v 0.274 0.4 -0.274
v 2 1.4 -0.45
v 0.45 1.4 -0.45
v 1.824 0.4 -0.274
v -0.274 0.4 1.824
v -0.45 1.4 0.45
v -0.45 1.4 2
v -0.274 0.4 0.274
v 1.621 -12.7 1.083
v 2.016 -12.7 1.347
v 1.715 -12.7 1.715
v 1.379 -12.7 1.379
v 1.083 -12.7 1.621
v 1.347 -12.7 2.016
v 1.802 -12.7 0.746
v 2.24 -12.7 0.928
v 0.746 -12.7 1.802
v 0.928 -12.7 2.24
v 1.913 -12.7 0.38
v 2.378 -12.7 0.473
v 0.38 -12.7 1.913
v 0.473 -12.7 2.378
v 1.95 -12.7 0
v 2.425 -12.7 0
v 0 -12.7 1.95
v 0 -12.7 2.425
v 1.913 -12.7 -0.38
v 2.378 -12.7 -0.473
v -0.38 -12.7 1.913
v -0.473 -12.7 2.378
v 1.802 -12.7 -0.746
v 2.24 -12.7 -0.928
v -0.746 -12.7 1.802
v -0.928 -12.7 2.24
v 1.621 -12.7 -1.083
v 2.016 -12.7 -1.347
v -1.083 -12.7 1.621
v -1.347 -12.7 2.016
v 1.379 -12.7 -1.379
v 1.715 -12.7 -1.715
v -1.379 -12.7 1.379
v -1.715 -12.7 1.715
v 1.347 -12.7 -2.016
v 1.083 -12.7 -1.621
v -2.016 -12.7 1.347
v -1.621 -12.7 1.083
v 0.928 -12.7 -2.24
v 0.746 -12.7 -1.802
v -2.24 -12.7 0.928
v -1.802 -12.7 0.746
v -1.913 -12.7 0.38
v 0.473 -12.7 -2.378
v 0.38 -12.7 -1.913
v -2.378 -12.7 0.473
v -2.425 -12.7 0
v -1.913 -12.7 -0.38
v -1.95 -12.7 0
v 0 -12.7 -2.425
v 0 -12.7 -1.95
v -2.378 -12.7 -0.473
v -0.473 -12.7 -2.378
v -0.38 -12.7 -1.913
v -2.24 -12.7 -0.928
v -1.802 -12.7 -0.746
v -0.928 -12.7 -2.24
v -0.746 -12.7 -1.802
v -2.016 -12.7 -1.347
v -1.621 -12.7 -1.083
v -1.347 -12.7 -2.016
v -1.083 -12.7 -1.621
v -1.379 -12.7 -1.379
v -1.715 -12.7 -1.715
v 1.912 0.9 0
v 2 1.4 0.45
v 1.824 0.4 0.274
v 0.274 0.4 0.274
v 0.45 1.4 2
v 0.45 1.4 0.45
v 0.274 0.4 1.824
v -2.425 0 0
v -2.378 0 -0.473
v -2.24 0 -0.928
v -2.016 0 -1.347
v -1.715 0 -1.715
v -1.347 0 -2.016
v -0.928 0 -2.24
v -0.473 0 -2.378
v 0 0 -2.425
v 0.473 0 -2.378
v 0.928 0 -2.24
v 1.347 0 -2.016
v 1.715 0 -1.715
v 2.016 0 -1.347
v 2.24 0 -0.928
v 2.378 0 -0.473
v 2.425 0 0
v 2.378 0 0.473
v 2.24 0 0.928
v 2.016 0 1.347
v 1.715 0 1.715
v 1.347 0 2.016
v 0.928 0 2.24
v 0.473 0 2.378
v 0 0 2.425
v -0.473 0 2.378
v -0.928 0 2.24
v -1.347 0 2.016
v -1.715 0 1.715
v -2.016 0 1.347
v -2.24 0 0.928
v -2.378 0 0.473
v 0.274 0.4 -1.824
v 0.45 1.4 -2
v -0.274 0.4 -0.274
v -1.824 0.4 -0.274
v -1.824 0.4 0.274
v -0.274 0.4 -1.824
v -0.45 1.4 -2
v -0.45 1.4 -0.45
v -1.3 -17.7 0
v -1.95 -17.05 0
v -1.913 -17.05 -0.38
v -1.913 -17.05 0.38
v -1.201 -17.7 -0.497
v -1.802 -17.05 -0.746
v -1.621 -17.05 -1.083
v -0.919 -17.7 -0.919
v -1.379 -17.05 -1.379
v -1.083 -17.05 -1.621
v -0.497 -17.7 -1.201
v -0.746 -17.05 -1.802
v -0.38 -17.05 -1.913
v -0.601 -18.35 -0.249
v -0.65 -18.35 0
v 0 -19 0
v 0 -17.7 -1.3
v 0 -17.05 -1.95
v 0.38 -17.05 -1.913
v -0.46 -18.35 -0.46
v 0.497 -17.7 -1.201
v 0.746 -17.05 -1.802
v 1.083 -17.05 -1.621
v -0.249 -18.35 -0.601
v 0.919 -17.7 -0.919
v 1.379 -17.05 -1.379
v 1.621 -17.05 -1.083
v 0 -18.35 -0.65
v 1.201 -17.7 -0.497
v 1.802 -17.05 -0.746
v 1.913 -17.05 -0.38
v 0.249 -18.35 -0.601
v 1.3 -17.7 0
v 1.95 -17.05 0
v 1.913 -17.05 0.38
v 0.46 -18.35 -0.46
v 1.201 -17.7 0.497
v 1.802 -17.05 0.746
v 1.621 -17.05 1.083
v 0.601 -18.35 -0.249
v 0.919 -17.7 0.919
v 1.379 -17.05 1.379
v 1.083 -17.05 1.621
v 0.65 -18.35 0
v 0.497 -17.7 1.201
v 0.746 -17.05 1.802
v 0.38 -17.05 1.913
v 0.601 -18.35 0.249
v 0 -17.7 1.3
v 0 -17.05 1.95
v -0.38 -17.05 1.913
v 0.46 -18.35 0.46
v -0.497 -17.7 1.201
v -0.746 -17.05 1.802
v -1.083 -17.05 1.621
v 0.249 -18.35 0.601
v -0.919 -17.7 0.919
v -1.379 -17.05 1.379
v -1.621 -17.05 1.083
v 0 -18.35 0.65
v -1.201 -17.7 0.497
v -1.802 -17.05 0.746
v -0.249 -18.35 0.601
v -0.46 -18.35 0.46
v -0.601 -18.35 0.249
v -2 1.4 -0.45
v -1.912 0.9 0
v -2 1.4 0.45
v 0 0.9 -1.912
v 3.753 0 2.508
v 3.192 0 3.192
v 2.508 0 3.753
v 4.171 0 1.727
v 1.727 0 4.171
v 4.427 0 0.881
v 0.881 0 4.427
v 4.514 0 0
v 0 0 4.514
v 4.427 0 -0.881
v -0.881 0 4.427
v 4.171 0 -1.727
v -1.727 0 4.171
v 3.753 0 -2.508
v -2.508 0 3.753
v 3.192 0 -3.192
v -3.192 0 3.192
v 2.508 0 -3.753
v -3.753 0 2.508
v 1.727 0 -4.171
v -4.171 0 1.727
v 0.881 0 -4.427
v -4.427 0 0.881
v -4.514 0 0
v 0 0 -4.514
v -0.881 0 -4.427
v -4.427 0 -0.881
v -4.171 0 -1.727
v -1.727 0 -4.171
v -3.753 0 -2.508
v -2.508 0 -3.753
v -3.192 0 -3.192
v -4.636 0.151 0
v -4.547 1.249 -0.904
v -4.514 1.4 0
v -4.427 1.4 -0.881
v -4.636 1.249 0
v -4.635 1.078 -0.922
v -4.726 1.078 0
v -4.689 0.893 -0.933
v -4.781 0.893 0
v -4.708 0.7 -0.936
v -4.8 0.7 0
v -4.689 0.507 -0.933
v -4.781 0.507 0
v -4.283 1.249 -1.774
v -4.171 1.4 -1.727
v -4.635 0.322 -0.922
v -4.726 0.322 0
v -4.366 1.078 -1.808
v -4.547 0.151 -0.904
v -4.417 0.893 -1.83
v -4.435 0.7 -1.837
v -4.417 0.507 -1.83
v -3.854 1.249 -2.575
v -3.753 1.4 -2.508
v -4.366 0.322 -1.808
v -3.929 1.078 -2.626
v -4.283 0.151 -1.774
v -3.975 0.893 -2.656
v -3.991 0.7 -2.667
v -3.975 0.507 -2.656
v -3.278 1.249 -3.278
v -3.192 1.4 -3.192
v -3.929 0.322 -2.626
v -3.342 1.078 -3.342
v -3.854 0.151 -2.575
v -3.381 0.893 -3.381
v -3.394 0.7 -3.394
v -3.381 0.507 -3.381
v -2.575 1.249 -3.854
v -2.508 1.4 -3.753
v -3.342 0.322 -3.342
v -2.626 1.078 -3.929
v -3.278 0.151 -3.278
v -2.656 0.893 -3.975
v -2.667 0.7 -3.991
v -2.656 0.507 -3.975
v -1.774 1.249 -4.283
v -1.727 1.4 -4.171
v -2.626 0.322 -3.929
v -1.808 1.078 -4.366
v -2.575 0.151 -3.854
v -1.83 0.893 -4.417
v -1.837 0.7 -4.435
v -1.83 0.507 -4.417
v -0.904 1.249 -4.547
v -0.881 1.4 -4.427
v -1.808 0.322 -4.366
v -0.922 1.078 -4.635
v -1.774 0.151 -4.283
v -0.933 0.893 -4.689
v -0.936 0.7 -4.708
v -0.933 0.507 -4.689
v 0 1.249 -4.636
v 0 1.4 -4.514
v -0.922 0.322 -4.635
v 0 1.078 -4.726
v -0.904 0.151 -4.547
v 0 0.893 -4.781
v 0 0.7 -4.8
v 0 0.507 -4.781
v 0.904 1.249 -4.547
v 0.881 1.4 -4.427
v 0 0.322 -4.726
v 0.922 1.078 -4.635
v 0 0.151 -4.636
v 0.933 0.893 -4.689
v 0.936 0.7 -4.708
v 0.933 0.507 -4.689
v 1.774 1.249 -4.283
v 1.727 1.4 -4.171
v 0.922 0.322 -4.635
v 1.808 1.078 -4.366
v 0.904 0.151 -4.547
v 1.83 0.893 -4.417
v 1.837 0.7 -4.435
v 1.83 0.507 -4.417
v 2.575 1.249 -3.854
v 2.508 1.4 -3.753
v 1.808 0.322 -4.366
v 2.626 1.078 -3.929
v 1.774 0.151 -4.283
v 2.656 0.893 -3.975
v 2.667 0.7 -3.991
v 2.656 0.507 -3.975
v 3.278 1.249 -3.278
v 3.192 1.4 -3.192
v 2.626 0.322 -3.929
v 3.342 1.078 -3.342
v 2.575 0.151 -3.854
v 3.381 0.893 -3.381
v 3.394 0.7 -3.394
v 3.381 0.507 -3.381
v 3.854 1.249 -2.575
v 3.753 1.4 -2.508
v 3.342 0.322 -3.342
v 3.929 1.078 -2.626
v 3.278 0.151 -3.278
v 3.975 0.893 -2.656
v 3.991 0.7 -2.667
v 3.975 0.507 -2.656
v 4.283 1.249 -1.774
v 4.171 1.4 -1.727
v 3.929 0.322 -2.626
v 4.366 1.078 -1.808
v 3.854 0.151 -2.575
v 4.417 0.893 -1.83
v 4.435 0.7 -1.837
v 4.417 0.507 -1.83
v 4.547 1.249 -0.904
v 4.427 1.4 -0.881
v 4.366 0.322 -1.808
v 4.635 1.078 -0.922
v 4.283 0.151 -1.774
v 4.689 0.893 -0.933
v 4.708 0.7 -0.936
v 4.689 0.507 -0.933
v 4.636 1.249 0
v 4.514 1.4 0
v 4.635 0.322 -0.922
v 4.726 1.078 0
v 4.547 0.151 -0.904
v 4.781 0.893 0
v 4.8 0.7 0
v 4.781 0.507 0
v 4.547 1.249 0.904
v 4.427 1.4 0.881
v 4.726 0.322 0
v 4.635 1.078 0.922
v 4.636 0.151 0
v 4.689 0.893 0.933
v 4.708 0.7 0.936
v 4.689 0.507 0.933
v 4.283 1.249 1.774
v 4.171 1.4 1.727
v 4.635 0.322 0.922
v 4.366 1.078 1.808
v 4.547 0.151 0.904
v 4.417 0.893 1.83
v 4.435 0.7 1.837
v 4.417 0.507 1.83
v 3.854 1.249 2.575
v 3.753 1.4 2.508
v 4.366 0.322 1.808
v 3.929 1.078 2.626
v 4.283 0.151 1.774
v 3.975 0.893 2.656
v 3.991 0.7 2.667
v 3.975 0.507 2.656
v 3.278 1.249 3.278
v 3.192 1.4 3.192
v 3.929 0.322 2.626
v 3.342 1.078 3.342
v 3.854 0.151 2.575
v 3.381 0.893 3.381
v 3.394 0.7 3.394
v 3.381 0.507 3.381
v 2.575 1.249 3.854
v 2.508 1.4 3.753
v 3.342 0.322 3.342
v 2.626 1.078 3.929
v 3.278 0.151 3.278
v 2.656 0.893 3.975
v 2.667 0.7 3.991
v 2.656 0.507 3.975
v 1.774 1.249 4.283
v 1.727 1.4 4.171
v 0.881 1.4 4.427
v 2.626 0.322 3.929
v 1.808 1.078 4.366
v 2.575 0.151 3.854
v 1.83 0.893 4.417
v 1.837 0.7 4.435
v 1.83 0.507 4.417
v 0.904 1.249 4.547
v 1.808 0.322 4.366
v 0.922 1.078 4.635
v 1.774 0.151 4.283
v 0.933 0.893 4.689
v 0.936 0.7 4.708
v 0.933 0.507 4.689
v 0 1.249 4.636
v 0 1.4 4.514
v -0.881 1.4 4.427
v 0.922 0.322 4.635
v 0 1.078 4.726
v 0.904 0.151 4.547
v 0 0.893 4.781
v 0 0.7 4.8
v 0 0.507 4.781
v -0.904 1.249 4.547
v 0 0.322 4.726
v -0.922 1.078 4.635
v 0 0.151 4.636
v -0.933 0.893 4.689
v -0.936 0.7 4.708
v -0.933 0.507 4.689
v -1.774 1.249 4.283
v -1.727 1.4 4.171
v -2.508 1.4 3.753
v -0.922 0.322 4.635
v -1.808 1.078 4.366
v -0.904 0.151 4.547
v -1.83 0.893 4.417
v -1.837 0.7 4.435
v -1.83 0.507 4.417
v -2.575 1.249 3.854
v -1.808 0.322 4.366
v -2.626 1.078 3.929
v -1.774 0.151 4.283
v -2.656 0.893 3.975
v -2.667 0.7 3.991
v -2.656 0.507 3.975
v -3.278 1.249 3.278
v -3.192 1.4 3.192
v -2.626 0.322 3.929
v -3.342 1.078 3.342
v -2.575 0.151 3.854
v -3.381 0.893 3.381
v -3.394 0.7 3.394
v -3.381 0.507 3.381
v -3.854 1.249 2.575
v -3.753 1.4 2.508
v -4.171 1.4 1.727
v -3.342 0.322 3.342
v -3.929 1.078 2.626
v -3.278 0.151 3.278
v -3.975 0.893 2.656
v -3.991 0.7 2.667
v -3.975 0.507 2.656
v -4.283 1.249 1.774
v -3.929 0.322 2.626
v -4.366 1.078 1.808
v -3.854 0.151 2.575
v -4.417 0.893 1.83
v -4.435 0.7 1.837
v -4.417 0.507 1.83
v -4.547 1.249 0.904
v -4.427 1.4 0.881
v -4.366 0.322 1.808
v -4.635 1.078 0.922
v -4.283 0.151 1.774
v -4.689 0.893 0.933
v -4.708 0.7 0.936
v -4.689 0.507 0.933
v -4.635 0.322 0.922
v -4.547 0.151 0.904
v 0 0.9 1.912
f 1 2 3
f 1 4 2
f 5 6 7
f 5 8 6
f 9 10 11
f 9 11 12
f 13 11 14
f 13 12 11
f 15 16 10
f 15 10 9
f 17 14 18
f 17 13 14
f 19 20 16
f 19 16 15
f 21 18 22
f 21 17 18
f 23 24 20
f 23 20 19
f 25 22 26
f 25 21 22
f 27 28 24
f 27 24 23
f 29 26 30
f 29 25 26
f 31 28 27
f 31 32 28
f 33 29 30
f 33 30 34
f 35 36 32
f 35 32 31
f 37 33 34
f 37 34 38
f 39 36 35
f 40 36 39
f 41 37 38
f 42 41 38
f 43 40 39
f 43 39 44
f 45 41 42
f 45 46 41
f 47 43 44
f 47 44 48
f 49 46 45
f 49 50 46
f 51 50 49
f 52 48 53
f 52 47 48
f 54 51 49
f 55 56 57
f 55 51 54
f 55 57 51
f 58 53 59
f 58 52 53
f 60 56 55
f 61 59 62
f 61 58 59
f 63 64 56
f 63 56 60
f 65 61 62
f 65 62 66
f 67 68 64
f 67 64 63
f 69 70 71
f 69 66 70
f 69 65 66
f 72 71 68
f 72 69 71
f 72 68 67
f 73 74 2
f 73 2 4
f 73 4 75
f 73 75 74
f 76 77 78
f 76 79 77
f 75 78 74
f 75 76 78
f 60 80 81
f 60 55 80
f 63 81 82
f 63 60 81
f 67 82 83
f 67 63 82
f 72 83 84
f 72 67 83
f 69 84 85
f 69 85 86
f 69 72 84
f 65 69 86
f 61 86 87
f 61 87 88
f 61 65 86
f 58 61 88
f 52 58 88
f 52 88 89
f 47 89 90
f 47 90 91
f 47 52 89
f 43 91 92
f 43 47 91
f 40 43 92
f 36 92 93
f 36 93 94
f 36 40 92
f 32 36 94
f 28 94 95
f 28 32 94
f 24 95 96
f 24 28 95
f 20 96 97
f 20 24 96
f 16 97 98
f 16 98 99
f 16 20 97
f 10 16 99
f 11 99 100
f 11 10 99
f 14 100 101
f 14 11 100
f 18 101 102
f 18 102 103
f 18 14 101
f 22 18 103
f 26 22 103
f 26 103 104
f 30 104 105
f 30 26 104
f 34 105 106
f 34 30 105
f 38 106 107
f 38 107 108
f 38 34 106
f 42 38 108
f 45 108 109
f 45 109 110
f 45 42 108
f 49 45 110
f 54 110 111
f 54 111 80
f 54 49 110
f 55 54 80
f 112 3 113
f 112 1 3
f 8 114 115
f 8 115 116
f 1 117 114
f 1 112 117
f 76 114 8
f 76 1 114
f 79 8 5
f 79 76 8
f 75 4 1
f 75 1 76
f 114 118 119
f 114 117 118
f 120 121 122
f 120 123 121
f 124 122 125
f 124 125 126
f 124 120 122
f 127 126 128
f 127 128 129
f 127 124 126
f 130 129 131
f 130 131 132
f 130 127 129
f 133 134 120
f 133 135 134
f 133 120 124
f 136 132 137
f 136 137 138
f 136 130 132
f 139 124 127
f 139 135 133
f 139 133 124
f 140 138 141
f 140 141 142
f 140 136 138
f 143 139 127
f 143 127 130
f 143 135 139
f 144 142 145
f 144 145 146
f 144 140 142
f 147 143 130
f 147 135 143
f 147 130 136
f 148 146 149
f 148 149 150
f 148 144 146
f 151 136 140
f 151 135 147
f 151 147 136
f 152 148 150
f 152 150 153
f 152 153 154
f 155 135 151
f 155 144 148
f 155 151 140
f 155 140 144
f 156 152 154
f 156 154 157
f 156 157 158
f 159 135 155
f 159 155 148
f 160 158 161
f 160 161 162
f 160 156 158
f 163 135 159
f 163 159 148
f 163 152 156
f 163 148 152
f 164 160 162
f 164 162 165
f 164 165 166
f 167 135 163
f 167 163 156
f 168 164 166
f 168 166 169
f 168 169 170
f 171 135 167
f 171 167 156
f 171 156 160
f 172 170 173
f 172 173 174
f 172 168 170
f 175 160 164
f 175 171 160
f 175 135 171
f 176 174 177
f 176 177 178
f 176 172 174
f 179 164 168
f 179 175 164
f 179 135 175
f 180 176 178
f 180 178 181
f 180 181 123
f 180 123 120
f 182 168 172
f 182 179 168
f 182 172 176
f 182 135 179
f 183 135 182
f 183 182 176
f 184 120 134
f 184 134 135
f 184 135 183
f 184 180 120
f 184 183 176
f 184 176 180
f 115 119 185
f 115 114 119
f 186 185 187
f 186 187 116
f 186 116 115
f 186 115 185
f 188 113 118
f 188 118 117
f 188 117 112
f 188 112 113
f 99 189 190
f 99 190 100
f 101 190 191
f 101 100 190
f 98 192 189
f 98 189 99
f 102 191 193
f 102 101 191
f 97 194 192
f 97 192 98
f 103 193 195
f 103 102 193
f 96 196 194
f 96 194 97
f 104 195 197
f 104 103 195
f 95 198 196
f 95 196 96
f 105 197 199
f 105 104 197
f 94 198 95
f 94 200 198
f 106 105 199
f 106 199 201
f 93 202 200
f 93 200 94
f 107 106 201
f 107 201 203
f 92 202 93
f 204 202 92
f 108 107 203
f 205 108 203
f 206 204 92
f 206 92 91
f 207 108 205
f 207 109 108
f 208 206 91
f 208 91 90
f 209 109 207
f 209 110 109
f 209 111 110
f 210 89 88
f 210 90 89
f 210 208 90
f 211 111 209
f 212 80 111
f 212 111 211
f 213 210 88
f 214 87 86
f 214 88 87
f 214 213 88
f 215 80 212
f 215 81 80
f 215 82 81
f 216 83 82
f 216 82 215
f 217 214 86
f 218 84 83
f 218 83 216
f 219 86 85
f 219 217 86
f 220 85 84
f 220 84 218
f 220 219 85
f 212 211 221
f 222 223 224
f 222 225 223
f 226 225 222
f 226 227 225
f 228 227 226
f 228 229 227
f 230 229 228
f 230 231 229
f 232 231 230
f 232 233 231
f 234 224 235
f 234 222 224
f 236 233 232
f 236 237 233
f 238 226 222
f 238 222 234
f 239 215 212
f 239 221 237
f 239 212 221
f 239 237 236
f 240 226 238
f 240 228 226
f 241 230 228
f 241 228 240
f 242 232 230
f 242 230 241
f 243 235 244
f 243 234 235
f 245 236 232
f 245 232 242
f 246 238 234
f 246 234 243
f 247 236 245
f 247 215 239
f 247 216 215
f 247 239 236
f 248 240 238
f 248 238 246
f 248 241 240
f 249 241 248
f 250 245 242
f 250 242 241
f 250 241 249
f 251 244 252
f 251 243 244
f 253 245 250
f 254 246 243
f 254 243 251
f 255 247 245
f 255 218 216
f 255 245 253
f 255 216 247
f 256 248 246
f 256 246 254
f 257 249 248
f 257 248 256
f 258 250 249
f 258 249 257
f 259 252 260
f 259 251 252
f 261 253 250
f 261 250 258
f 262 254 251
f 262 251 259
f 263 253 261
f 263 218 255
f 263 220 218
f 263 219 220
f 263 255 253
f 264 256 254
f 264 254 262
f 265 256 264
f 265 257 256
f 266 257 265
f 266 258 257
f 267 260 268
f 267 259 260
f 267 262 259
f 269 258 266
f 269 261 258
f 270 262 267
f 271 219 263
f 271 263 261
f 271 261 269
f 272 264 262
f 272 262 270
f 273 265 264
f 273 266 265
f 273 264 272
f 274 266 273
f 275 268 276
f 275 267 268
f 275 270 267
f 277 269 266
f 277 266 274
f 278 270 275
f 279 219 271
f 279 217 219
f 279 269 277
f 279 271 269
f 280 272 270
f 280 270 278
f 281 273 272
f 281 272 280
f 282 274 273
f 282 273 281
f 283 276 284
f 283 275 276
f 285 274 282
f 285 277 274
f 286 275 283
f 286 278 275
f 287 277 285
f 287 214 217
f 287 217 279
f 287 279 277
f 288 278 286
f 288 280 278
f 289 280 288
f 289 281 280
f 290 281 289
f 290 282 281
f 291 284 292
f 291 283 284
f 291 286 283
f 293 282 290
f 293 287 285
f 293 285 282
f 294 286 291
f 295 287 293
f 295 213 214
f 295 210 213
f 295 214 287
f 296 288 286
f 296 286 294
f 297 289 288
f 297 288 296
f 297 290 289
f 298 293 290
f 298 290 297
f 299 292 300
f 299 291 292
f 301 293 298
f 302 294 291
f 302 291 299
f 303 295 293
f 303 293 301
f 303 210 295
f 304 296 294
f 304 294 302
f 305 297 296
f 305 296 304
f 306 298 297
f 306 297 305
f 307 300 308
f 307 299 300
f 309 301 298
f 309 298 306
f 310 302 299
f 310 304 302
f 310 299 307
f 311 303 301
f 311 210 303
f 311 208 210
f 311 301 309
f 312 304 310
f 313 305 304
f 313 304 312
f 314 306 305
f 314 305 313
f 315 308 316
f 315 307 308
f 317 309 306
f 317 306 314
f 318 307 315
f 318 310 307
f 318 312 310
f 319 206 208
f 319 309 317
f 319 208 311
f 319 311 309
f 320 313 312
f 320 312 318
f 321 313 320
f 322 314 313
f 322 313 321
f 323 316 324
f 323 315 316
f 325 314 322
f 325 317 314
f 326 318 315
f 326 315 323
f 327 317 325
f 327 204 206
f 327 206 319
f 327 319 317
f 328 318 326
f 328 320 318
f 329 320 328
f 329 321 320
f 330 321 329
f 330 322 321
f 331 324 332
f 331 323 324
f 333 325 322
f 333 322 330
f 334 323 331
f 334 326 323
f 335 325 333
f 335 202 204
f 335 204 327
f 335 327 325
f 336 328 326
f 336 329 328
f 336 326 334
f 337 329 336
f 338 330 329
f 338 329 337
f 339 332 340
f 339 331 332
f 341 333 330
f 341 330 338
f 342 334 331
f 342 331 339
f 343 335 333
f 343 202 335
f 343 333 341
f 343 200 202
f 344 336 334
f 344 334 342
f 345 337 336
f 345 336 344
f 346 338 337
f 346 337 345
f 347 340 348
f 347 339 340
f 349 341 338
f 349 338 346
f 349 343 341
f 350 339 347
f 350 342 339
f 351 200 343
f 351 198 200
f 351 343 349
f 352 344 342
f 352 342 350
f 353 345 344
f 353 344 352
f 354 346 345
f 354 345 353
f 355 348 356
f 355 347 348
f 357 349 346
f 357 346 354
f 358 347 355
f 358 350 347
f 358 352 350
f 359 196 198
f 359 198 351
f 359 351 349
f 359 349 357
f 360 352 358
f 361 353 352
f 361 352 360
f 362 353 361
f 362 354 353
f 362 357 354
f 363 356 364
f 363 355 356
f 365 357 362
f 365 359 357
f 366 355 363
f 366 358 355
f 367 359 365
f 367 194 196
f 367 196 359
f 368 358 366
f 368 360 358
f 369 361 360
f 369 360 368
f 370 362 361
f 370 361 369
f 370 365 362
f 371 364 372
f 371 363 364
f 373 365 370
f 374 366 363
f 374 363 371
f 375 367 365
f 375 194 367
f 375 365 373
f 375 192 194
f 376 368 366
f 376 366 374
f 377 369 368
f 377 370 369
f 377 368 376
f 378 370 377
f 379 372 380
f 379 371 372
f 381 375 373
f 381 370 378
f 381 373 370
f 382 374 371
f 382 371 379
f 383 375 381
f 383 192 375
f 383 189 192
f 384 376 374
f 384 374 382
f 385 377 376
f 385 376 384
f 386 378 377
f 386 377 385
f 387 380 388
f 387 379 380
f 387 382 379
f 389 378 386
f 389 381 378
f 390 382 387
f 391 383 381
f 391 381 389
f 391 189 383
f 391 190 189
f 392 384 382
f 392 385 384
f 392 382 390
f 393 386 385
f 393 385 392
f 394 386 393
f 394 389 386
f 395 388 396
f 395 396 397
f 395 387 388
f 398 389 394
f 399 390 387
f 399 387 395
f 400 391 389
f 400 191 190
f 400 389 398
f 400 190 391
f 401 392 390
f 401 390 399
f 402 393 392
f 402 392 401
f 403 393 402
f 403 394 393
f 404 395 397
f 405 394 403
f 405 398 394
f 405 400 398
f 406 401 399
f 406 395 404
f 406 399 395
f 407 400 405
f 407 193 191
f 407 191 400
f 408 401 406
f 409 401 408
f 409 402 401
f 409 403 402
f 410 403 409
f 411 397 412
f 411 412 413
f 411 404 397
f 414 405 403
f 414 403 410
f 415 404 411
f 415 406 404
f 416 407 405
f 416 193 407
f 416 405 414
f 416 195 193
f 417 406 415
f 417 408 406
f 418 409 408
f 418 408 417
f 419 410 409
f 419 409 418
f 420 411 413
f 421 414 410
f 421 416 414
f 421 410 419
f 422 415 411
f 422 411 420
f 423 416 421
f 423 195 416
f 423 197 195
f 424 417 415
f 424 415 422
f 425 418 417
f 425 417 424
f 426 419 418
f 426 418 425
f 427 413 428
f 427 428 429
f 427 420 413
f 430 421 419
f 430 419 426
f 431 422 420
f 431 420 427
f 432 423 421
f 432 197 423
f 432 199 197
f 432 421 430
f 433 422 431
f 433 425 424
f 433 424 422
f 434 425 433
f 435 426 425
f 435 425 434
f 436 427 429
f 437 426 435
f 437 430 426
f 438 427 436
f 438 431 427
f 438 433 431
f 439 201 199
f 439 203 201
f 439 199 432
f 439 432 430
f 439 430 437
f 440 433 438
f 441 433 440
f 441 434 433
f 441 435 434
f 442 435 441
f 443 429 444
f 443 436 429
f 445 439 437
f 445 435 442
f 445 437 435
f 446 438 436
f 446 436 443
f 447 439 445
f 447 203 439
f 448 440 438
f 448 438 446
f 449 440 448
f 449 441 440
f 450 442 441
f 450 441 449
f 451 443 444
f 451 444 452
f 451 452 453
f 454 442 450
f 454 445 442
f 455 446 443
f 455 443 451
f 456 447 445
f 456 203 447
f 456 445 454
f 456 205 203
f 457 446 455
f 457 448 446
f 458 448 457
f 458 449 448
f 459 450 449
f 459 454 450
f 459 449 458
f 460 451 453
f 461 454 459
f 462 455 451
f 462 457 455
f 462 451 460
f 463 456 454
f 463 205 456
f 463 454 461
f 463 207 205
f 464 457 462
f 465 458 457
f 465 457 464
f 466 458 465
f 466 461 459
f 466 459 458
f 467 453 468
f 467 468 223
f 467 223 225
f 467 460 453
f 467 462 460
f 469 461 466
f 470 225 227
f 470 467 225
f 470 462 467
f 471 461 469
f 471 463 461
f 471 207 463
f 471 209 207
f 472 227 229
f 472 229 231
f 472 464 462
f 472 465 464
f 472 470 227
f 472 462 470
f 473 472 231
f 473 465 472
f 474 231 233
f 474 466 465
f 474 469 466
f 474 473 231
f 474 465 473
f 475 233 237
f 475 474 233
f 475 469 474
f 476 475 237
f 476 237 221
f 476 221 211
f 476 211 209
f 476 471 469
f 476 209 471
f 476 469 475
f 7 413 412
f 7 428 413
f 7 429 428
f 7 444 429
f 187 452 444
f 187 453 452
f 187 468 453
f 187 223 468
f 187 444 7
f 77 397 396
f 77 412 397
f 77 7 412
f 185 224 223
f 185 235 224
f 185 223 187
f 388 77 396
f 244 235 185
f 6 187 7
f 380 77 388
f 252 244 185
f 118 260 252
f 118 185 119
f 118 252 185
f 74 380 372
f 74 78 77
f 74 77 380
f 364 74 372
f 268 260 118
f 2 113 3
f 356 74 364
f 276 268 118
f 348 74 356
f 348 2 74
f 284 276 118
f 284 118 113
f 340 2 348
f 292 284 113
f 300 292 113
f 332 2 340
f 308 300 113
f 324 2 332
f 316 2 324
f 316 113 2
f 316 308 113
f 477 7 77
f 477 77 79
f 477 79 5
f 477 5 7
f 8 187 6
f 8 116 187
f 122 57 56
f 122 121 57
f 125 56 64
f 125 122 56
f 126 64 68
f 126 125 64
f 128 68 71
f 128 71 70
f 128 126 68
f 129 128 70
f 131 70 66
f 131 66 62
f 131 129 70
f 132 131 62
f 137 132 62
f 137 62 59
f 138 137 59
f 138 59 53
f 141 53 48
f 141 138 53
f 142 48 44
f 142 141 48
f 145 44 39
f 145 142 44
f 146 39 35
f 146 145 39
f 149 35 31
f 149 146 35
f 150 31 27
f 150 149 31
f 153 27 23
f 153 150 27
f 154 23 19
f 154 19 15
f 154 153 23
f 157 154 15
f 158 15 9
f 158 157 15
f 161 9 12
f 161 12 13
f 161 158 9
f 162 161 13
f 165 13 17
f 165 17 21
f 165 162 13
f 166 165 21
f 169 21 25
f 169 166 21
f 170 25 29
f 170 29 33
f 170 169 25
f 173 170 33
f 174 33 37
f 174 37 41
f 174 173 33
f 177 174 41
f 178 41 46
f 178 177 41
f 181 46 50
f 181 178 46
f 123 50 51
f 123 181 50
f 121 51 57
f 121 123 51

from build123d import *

# Parameters (mm, degrees)
CUT_EXTRUDE1_DEPTH = 1
CUT_EXTRUDE1_TAPER = 10


with BuildPart() as part:
    # Sketch2 → Revolve1 (revolve)
    with BuildSketch(Plane.XY):
        with BuildLine():
            Line((-2.425, 0), (-2.425, -12.7))
            Line((-2.425, -12.7), (-1.95, -12.7))
            Line((-1.95, -12.7), (-1.95, -17.05))
            Line((-1.95, -17.05), (0, -19))
            Line((0, -19), (0, 0))
            Line((0, 0), (0, 1.4))
            Line((0, 1.4), (-4.514142843, 1.4))
            ThreePointArc((-4.514142843, 1.4), (-4.8, 0.7), (-4.514142843, 0))
            Line((-4.514142843, 0), (-2.425, 0))
        make_face()
    revolve(axis=Axis((0, -19, 0), (0, -1, 0)))

    # Sketch3 → Cut-Extrude1 (cut)
    with BuildSketch(Plane(origin=(0, 1.4, 0), x_dir=(1, 0, 0), z_dir=(0, 1, 0))):
        Polygon((-0.45, 2), (-0.45, 0.45), (-2, 0.45), (-2, -0.45), (-0.45, -0.45), (-0.45, -2), (0.45, -2), (0.45, -0.45), (2, -0.45), (2, 0.45), (0.45, 0.45), (0.45, 2), align=None)
    extrude(amount=-CUT_EXTRUDE1_DEPTH, taper=CUT_EXTRUDE1_TAPER, mode=Mode.SUBTRACT)


solid = part.part
